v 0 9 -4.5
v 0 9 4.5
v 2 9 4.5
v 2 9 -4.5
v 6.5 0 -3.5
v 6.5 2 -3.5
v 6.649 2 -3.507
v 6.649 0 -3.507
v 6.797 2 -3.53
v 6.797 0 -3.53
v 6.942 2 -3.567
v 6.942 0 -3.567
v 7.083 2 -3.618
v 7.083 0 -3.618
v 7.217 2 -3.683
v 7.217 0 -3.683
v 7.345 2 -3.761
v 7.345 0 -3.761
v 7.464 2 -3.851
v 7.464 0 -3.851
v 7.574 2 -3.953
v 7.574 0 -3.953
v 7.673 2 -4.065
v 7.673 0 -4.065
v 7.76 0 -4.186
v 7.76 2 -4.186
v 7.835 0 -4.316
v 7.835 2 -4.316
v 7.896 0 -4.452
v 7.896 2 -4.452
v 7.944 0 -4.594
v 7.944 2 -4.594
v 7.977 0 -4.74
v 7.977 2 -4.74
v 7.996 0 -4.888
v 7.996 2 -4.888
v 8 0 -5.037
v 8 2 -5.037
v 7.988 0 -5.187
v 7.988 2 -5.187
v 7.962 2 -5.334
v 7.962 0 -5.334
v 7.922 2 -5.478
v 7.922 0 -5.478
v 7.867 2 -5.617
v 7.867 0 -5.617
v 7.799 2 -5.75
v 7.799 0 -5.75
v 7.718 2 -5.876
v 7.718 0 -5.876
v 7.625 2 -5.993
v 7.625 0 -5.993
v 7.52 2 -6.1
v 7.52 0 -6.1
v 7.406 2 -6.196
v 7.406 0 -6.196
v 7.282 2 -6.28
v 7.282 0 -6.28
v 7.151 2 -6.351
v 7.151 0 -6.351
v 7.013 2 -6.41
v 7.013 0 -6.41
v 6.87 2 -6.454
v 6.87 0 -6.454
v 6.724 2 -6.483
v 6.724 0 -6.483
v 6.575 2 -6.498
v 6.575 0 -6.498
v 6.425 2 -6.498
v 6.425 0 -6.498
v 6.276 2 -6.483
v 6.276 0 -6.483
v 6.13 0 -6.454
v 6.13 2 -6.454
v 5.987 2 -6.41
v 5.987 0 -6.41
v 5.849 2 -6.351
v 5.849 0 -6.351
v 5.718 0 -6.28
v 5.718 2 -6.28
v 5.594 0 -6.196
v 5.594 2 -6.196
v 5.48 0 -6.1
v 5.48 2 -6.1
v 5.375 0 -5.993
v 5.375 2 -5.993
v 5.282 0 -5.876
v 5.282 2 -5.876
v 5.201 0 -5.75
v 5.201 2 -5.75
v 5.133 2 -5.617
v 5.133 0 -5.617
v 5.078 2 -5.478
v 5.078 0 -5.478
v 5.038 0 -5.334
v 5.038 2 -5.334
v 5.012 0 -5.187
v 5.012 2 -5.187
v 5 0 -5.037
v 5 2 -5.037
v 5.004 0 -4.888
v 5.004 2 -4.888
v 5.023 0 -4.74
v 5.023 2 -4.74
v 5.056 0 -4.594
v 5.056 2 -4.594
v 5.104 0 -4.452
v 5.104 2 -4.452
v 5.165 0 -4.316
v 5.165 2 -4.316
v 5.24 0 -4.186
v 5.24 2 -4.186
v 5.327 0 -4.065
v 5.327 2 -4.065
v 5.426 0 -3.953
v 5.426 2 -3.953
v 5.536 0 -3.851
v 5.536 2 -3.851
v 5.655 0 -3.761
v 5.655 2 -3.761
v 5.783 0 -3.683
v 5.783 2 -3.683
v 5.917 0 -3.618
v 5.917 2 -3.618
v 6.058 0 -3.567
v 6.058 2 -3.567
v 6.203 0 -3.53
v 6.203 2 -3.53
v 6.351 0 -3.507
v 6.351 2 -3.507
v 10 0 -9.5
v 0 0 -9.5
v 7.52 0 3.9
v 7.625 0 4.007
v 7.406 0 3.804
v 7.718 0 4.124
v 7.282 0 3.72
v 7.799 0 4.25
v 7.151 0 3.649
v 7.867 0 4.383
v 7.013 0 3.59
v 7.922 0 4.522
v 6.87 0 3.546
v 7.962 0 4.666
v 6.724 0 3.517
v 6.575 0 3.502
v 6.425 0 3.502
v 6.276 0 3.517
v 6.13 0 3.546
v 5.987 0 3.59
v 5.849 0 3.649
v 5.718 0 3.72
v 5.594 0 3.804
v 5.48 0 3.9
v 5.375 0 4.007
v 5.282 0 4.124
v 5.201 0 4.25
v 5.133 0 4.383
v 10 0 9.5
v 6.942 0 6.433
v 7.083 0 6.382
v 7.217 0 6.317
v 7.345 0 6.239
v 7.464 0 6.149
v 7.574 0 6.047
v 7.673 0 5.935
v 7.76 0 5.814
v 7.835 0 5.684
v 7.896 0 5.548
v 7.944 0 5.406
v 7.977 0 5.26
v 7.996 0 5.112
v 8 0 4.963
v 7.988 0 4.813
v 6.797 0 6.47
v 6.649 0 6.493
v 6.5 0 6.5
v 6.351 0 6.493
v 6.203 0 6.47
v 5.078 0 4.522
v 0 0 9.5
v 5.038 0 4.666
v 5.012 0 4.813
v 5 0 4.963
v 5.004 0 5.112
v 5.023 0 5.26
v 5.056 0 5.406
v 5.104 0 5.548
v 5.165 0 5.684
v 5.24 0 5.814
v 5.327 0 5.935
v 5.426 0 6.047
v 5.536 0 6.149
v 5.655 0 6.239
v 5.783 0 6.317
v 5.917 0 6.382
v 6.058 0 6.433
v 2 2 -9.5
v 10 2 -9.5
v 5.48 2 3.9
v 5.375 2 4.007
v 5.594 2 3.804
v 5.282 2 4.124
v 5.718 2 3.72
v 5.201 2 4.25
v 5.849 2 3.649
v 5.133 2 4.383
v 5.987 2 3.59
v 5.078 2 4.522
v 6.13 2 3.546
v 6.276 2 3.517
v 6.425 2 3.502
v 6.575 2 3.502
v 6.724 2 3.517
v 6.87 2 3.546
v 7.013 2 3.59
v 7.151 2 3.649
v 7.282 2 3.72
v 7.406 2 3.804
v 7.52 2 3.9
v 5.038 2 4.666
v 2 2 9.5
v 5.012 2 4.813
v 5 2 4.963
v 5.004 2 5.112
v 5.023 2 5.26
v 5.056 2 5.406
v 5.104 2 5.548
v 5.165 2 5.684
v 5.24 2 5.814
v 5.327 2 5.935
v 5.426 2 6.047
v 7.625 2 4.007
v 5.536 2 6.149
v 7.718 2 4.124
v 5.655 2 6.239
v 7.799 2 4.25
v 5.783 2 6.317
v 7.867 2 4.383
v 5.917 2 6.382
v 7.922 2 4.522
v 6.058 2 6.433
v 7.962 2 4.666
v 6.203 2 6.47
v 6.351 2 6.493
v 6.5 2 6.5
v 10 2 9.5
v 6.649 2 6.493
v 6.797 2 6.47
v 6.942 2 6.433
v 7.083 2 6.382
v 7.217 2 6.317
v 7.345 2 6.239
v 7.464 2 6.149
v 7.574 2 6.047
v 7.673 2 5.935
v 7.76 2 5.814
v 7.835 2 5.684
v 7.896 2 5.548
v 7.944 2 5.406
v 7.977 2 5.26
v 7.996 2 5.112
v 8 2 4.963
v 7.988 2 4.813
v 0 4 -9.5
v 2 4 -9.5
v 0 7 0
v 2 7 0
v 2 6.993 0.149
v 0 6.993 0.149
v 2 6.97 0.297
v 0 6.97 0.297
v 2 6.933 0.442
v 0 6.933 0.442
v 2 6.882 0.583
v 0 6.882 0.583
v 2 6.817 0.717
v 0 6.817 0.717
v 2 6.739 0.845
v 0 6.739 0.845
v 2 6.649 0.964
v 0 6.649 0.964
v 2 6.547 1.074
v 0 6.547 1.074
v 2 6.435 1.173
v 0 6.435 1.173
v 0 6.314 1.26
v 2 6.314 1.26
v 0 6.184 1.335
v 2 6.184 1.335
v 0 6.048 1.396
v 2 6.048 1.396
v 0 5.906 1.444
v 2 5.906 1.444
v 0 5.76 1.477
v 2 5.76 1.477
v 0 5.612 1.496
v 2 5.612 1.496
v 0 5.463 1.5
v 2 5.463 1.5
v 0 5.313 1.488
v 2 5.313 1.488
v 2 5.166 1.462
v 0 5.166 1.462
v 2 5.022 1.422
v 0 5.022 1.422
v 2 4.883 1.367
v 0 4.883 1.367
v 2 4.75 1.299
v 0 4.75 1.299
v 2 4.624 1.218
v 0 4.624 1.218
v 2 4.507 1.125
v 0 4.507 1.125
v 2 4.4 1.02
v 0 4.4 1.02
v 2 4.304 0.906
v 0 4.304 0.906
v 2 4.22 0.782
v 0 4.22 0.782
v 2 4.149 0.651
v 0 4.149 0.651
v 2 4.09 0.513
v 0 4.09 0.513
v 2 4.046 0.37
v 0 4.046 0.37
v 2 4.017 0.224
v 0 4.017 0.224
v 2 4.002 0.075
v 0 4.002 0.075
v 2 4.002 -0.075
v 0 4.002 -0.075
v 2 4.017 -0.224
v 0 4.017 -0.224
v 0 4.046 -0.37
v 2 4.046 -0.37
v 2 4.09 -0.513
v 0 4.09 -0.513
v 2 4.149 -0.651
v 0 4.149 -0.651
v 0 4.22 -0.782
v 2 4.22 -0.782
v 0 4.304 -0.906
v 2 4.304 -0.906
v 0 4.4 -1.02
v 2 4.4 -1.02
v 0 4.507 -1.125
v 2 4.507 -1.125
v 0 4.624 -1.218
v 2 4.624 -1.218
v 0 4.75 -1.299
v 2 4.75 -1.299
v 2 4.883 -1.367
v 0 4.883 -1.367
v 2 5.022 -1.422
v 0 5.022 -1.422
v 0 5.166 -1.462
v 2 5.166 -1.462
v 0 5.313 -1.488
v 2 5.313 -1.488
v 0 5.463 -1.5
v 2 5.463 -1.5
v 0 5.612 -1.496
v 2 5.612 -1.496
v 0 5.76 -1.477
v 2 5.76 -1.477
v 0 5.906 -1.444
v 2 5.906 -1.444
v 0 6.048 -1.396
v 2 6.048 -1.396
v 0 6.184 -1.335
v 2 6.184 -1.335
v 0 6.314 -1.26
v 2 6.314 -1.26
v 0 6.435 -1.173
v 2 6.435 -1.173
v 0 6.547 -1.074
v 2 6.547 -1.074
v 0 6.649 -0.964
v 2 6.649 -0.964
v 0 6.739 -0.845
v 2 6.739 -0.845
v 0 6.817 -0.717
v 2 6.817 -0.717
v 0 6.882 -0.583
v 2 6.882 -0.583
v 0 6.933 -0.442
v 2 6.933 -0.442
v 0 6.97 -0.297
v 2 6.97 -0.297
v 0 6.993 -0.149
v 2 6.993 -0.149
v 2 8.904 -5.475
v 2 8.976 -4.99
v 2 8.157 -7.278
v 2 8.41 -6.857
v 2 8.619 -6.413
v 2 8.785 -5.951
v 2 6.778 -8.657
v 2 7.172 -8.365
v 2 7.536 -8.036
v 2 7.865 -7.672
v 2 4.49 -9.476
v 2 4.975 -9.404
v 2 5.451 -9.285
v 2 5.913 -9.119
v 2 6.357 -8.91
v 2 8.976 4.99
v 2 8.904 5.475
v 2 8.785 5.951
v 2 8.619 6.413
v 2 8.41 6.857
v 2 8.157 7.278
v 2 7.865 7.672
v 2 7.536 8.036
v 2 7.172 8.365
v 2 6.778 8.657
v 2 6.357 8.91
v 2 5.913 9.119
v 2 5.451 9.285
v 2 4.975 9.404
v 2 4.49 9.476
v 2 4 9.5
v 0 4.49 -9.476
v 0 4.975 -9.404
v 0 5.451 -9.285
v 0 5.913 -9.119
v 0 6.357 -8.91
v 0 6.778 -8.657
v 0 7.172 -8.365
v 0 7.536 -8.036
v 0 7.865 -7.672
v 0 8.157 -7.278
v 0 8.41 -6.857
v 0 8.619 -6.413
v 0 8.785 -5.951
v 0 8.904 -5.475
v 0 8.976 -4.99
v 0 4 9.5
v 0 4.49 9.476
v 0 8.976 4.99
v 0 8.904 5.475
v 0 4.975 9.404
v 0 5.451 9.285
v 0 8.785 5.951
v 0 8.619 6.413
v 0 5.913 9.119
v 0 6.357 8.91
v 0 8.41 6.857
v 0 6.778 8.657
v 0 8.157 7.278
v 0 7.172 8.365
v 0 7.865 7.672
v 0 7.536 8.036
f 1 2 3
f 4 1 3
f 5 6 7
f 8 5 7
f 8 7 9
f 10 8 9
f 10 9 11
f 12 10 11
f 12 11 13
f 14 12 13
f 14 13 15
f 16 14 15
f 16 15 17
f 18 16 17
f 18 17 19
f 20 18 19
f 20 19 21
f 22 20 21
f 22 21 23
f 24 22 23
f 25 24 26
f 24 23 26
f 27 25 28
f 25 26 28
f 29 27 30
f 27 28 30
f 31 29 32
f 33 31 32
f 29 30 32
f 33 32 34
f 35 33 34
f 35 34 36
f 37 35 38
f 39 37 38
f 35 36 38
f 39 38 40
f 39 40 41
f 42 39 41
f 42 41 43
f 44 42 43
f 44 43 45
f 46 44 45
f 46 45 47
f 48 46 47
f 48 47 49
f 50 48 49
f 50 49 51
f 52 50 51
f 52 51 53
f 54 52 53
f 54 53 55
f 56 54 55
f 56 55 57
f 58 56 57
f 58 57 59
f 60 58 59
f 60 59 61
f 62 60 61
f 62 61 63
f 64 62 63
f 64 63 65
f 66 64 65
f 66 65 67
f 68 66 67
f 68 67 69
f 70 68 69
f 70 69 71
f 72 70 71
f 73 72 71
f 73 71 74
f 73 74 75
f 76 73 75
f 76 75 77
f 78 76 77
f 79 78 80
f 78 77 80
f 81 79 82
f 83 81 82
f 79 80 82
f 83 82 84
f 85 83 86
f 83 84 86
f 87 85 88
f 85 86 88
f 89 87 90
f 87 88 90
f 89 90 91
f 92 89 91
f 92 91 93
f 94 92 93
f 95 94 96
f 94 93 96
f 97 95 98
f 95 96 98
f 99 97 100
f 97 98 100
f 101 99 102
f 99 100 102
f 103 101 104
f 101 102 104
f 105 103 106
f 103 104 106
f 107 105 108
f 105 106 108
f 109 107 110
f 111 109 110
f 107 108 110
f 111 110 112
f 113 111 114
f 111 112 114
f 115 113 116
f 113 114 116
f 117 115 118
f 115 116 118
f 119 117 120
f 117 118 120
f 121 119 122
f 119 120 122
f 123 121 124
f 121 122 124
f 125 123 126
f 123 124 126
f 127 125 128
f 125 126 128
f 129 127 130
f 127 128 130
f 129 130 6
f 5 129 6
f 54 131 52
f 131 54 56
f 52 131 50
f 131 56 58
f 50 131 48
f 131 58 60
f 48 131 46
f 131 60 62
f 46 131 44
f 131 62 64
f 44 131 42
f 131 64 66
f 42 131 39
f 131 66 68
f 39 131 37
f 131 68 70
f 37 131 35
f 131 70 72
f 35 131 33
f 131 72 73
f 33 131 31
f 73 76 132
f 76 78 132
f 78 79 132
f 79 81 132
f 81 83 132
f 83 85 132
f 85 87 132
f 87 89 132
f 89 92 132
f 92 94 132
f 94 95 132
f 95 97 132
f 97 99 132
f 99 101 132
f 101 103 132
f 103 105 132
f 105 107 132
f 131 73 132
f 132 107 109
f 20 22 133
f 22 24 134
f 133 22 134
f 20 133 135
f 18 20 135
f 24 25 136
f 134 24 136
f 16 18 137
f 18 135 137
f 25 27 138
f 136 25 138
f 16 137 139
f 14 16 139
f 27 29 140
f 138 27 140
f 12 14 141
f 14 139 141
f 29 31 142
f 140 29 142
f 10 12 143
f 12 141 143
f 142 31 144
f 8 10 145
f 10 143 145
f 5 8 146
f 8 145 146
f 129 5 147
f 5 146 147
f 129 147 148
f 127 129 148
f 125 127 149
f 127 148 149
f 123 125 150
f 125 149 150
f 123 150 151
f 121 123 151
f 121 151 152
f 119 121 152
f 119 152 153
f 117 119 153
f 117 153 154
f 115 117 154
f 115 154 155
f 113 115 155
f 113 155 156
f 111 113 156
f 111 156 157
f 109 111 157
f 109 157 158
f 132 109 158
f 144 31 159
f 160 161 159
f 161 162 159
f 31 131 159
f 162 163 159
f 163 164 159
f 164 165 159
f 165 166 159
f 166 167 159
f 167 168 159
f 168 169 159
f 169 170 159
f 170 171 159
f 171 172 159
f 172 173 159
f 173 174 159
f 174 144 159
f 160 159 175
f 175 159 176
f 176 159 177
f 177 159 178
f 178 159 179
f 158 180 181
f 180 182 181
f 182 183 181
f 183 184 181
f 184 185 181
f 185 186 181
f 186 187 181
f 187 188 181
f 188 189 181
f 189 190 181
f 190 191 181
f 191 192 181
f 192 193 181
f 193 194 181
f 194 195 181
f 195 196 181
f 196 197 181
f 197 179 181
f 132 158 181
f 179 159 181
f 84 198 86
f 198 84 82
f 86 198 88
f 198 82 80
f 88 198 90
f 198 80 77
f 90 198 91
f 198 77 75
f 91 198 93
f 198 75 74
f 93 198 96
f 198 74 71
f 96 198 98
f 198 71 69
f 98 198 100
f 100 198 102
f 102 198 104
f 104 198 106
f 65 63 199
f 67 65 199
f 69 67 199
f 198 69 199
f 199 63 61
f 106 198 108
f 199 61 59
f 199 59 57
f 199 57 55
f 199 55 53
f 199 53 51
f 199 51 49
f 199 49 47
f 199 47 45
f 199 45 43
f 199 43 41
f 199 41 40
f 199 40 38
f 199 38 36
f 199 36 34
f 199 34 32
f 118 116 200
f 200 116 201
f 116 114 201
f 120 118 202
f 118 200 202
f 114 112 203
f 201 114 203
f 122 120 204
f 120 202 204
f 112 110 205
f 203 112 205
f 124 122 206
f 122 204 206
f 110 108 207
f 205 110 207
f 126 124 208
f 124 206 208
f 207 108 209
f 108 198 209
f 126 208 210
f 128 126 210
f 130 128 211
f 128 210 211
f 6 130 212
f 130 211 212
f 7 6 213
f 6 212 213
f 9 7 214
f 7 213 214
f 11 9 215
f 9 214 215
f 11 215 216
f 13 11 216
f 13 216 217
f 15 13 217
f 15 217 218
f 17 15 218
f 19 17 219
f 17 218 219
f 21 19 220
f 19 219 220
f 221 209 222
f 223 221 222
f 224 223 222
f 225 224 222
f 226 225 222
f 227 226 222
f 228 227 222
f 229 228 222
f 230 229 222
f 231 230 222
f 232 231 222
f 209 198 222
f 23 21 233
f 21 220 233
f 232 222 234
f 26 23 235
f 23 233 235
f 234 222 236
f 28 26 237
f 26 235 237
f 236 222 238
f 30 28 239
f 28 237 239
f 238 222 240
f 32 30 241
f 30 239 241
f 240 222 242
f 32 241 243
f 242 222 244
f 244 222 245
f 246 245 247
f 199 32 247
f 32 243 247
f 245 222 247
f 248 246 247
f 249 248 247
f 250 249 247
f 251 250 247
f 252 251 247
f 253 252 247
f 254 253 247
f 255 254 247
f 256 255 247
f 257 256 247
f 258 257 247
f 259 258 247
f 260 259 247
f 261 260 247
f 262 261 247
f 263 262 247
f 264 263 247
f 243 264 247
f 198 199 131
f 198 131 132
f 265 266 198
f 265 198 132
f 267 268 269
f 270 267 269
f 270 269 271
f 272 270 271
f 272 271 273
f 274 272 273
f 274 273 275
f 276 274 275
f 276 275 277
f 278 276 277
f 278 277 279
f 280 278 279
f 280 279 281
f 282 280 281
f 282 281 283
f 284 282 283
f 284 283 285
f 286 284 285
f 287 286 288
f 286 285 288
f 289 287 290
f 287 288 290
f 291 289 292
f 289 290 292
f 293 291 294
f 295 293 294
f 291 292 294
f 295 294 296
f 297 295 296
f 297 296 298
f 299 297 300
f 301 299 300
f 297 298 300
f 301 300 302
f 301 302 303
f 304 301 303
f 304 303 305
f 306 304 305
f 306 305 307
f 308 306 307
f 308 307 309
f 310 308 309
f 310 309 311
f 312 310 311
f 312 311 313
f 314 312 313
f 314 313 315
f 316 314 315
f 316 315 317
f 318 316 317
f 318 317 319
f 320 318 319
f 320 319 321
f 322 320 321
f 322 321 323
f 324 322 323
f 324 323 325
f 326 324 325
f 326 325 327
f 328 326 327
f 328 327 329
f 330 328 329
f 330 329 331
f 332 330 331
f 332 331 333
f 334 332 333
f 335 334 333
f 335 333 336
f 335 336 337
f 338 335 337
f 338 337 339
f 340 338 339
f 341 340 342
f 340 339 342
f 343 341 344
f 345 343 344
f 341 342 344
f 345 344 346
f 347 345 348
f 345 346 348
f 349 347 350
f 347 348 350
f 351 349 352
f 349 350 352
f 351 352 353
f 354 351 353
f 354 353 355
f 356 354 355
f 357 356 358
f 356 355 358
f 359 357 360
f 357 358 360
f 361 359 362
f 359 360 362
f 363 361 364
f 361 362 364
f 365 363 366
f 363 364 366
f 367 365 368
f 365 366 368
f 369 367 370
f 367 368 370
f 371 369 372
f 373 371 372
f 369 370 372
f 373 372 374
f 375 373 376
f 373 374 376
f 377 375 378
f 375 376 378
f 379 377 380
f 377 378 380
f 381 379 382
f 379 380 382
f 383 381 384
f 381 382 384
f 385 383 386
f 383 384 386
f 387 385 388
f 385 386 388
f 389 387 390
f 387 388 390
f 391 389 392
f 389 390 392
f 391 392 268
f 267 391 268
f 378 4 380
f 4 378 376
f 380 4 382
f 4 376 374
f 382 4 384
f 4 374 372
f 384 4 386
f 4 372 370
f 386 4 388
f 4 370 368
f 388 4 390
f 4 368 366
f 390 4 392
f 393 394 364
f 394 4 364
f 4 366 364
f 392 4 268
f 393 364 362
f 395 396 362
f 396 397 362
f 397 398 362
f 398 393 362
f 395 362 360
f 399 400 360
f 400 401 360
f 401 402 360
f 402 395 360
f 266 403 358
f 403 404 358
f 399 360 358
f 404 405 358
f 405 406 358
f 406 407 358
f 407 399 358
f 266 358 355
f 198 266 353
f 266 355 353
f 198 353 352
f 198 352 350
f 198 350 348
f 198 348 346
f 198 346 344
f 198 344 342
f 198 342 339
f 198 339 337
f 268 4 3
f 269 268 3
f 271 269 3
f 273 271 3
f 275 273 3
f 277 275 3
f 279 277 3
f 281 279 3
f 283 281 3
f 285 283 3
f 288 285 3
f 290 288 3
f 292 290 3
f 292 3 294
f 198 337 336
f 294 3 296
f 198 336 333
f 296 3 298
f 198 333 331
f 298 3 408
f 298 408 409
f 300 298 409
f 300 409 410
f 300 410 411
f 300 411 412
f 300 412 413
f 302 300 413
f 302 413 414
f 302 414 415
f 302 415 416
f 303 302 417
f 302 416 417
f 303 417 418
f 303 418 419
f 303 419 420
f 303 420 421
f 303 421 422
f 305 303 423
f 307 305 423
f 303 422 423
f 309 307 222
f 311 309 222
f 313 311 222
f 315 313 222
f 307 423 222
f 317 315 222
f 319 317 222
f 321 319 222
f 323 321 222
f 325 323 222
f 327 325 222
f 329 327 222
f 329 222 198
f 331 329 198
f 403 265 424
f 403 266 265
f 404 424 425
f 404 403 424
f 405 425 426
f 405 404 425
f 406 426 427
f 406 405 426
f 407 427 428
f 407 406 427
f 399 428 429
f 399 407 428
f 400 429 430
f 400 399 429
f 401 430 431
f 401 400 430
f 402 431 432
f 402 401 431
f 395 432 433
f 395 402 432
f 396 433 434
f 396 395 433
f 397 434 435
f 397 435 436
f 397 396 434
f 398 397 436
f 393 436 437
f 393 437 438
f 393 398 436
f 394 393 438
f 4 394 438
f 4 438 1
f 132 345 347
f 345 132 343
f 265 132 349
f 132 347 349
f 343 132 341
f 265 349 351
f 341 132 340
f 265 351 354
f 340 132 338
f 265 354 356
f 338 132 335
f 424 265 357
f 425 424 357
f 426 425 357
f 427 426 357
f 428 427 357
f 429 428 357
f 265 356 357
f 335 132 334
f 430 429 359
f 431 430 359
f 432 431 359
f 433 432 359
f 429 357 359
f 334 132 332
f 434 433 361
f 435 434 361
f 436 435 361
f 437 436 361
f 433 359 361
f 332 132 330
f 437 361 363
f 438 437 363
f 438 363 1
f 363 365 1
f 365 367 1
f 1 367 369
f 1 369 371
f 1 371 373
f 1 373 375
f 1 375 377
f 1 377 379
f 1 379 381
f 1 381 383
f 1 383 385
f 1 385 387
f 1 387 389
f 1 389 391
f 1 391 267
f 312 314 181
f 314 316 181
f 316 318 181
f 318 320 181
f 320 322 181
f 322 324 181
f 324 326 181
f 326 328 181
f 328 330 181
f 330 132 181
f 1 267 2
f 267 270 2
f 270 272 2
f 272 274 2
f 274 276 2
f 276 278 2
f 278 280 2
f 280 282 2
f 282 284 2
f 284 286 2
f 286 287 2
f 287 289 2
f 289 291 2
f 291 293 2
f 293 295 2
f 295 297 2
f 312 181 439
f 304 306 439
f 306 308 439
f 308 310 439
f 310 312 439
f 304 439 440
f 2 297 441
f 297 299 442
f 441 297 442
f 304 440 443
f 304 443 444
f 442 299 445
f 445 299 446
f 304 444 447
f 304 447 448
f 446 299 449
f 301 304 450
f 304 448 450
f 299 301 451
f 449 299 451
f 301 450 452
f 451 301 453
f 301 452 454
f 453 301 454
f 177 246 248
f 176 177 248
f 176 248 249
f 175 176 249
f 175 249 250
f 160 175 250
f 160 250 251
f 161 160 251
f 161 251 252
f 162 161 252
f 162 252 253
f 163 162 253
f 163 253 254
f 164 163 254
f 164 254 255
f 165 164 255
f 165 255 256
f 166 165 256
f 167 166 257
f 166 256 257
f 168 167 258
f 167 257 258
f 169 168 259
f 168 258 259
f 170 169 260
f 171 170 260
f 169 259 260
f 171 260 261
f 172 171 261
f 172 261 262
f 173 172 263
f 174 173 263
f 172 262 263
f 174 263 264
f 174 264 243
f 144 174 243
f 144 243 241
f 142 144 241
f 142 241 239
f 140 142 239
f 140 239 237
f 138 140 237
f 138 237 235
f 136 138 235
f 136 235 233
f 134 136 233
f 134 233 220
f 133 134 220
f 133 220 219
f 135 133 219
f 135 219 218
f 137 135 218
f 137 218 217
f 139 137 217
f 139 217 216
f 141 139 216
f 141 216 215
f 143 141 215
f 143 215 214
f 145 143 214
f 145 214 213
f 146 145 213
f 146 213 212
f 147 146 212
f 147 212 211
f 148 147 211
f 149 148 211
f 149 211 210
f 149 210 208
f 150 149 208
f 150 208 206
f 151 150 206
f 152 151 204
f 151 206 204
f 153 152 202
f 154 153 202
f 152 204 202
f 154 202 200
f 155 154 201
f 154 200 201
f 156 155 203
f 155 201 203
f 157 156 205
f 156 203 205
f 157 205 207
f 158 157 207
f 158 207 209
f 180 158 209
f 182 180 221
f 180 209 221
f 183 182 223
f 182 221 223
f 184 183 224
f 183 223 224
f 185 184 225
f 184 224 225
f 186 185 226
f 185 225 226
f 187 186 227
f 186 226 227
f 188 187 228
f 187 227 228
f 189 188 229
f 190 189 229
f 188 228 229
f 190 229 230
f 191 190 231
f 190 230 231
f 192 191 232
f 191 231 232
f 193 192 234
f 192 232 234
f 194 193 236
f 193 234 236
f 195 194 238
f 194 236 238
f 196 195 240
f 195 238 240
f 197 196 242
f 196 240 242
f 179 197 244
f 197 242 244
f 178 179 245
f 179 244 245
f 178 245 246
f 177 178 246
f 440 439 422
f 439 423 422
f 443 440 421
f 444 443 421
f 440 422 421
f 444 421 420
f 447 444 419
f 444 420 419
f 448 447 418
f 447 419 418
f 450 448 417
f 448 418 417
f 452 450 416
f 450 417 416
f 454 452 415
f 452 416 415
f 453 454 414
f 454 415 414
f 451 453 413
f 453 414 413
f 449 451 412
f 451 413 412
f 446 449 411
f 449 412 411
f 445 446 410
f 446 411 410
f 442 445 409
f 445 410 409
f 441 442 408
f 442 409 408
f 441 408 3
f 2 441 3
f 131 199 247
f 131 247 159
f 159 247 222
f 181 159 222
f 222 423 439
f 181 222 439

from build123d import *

# Parameters (mm, degrees)
BOSS_EXTRUDE1_DEPTH = 9.5
SKETCH2_R           = 1.5
CUT_EXTRUDE1_DEPTH  = 19
SKETCH3_R           = 1.5
CUT_EXTRUDE2_DEPTH  = 19
FILLET1_R           = 5


with BuildPart() as part:
    # Sketch1 → Boss-Extrude1 (new, symmetric)
    with BuildSketch(Plane.XY):
        Polygon((0, 0), (0, 9), (2, 9), (2, 2), (10, 2), (10, 0), align=None)
    extrude(amount=BOSS_EXTRUDE1_DEPTH, both=True)

    # Sketch2 → Cut-Extrude1 (cut)
    with BuildSketch(Plane(origin=(0, 2, 0), x_dir=(1, 0, 0), z_dir=(0, 1, 0))):
        with Locations(Location((6.5, 5, 0), (0, 0, 270))):
            Circle(SKETCH2_R)
        with Locations(Location((6.5, -5, 0), (0, 0, 270))):
            Circle(SKETCH2_R)
    extrude(amount=-CUT_EXTRUDE1_DEPTH, mode=Mode.SUBTRACT)

    # Sketch3 → Cut-Extrude2 (cut)
    with BuildSketch(Plane(origin=(2, 0, 0), x_dir=(0, 0, -1), z_dir=(1, 0, 0))):
        with Locations(Location((0, 5.5, 0), (0, 0, 90))):
            Circle(SKETCH3_R)
    extrude(amount=-CUT_EXTRUDE2_DEPTH, mode=Mode.SUBTRACT)

    # Fillet1
    fillet1_edges = [part.edges().sort_by_distance(p)[0] for p in [
        (1, 9, 9.5),
        (1, 9, -9.5),
    ]]
    fillet(fillet1_edges, radius=FILLET1_R)


solid = part.part
